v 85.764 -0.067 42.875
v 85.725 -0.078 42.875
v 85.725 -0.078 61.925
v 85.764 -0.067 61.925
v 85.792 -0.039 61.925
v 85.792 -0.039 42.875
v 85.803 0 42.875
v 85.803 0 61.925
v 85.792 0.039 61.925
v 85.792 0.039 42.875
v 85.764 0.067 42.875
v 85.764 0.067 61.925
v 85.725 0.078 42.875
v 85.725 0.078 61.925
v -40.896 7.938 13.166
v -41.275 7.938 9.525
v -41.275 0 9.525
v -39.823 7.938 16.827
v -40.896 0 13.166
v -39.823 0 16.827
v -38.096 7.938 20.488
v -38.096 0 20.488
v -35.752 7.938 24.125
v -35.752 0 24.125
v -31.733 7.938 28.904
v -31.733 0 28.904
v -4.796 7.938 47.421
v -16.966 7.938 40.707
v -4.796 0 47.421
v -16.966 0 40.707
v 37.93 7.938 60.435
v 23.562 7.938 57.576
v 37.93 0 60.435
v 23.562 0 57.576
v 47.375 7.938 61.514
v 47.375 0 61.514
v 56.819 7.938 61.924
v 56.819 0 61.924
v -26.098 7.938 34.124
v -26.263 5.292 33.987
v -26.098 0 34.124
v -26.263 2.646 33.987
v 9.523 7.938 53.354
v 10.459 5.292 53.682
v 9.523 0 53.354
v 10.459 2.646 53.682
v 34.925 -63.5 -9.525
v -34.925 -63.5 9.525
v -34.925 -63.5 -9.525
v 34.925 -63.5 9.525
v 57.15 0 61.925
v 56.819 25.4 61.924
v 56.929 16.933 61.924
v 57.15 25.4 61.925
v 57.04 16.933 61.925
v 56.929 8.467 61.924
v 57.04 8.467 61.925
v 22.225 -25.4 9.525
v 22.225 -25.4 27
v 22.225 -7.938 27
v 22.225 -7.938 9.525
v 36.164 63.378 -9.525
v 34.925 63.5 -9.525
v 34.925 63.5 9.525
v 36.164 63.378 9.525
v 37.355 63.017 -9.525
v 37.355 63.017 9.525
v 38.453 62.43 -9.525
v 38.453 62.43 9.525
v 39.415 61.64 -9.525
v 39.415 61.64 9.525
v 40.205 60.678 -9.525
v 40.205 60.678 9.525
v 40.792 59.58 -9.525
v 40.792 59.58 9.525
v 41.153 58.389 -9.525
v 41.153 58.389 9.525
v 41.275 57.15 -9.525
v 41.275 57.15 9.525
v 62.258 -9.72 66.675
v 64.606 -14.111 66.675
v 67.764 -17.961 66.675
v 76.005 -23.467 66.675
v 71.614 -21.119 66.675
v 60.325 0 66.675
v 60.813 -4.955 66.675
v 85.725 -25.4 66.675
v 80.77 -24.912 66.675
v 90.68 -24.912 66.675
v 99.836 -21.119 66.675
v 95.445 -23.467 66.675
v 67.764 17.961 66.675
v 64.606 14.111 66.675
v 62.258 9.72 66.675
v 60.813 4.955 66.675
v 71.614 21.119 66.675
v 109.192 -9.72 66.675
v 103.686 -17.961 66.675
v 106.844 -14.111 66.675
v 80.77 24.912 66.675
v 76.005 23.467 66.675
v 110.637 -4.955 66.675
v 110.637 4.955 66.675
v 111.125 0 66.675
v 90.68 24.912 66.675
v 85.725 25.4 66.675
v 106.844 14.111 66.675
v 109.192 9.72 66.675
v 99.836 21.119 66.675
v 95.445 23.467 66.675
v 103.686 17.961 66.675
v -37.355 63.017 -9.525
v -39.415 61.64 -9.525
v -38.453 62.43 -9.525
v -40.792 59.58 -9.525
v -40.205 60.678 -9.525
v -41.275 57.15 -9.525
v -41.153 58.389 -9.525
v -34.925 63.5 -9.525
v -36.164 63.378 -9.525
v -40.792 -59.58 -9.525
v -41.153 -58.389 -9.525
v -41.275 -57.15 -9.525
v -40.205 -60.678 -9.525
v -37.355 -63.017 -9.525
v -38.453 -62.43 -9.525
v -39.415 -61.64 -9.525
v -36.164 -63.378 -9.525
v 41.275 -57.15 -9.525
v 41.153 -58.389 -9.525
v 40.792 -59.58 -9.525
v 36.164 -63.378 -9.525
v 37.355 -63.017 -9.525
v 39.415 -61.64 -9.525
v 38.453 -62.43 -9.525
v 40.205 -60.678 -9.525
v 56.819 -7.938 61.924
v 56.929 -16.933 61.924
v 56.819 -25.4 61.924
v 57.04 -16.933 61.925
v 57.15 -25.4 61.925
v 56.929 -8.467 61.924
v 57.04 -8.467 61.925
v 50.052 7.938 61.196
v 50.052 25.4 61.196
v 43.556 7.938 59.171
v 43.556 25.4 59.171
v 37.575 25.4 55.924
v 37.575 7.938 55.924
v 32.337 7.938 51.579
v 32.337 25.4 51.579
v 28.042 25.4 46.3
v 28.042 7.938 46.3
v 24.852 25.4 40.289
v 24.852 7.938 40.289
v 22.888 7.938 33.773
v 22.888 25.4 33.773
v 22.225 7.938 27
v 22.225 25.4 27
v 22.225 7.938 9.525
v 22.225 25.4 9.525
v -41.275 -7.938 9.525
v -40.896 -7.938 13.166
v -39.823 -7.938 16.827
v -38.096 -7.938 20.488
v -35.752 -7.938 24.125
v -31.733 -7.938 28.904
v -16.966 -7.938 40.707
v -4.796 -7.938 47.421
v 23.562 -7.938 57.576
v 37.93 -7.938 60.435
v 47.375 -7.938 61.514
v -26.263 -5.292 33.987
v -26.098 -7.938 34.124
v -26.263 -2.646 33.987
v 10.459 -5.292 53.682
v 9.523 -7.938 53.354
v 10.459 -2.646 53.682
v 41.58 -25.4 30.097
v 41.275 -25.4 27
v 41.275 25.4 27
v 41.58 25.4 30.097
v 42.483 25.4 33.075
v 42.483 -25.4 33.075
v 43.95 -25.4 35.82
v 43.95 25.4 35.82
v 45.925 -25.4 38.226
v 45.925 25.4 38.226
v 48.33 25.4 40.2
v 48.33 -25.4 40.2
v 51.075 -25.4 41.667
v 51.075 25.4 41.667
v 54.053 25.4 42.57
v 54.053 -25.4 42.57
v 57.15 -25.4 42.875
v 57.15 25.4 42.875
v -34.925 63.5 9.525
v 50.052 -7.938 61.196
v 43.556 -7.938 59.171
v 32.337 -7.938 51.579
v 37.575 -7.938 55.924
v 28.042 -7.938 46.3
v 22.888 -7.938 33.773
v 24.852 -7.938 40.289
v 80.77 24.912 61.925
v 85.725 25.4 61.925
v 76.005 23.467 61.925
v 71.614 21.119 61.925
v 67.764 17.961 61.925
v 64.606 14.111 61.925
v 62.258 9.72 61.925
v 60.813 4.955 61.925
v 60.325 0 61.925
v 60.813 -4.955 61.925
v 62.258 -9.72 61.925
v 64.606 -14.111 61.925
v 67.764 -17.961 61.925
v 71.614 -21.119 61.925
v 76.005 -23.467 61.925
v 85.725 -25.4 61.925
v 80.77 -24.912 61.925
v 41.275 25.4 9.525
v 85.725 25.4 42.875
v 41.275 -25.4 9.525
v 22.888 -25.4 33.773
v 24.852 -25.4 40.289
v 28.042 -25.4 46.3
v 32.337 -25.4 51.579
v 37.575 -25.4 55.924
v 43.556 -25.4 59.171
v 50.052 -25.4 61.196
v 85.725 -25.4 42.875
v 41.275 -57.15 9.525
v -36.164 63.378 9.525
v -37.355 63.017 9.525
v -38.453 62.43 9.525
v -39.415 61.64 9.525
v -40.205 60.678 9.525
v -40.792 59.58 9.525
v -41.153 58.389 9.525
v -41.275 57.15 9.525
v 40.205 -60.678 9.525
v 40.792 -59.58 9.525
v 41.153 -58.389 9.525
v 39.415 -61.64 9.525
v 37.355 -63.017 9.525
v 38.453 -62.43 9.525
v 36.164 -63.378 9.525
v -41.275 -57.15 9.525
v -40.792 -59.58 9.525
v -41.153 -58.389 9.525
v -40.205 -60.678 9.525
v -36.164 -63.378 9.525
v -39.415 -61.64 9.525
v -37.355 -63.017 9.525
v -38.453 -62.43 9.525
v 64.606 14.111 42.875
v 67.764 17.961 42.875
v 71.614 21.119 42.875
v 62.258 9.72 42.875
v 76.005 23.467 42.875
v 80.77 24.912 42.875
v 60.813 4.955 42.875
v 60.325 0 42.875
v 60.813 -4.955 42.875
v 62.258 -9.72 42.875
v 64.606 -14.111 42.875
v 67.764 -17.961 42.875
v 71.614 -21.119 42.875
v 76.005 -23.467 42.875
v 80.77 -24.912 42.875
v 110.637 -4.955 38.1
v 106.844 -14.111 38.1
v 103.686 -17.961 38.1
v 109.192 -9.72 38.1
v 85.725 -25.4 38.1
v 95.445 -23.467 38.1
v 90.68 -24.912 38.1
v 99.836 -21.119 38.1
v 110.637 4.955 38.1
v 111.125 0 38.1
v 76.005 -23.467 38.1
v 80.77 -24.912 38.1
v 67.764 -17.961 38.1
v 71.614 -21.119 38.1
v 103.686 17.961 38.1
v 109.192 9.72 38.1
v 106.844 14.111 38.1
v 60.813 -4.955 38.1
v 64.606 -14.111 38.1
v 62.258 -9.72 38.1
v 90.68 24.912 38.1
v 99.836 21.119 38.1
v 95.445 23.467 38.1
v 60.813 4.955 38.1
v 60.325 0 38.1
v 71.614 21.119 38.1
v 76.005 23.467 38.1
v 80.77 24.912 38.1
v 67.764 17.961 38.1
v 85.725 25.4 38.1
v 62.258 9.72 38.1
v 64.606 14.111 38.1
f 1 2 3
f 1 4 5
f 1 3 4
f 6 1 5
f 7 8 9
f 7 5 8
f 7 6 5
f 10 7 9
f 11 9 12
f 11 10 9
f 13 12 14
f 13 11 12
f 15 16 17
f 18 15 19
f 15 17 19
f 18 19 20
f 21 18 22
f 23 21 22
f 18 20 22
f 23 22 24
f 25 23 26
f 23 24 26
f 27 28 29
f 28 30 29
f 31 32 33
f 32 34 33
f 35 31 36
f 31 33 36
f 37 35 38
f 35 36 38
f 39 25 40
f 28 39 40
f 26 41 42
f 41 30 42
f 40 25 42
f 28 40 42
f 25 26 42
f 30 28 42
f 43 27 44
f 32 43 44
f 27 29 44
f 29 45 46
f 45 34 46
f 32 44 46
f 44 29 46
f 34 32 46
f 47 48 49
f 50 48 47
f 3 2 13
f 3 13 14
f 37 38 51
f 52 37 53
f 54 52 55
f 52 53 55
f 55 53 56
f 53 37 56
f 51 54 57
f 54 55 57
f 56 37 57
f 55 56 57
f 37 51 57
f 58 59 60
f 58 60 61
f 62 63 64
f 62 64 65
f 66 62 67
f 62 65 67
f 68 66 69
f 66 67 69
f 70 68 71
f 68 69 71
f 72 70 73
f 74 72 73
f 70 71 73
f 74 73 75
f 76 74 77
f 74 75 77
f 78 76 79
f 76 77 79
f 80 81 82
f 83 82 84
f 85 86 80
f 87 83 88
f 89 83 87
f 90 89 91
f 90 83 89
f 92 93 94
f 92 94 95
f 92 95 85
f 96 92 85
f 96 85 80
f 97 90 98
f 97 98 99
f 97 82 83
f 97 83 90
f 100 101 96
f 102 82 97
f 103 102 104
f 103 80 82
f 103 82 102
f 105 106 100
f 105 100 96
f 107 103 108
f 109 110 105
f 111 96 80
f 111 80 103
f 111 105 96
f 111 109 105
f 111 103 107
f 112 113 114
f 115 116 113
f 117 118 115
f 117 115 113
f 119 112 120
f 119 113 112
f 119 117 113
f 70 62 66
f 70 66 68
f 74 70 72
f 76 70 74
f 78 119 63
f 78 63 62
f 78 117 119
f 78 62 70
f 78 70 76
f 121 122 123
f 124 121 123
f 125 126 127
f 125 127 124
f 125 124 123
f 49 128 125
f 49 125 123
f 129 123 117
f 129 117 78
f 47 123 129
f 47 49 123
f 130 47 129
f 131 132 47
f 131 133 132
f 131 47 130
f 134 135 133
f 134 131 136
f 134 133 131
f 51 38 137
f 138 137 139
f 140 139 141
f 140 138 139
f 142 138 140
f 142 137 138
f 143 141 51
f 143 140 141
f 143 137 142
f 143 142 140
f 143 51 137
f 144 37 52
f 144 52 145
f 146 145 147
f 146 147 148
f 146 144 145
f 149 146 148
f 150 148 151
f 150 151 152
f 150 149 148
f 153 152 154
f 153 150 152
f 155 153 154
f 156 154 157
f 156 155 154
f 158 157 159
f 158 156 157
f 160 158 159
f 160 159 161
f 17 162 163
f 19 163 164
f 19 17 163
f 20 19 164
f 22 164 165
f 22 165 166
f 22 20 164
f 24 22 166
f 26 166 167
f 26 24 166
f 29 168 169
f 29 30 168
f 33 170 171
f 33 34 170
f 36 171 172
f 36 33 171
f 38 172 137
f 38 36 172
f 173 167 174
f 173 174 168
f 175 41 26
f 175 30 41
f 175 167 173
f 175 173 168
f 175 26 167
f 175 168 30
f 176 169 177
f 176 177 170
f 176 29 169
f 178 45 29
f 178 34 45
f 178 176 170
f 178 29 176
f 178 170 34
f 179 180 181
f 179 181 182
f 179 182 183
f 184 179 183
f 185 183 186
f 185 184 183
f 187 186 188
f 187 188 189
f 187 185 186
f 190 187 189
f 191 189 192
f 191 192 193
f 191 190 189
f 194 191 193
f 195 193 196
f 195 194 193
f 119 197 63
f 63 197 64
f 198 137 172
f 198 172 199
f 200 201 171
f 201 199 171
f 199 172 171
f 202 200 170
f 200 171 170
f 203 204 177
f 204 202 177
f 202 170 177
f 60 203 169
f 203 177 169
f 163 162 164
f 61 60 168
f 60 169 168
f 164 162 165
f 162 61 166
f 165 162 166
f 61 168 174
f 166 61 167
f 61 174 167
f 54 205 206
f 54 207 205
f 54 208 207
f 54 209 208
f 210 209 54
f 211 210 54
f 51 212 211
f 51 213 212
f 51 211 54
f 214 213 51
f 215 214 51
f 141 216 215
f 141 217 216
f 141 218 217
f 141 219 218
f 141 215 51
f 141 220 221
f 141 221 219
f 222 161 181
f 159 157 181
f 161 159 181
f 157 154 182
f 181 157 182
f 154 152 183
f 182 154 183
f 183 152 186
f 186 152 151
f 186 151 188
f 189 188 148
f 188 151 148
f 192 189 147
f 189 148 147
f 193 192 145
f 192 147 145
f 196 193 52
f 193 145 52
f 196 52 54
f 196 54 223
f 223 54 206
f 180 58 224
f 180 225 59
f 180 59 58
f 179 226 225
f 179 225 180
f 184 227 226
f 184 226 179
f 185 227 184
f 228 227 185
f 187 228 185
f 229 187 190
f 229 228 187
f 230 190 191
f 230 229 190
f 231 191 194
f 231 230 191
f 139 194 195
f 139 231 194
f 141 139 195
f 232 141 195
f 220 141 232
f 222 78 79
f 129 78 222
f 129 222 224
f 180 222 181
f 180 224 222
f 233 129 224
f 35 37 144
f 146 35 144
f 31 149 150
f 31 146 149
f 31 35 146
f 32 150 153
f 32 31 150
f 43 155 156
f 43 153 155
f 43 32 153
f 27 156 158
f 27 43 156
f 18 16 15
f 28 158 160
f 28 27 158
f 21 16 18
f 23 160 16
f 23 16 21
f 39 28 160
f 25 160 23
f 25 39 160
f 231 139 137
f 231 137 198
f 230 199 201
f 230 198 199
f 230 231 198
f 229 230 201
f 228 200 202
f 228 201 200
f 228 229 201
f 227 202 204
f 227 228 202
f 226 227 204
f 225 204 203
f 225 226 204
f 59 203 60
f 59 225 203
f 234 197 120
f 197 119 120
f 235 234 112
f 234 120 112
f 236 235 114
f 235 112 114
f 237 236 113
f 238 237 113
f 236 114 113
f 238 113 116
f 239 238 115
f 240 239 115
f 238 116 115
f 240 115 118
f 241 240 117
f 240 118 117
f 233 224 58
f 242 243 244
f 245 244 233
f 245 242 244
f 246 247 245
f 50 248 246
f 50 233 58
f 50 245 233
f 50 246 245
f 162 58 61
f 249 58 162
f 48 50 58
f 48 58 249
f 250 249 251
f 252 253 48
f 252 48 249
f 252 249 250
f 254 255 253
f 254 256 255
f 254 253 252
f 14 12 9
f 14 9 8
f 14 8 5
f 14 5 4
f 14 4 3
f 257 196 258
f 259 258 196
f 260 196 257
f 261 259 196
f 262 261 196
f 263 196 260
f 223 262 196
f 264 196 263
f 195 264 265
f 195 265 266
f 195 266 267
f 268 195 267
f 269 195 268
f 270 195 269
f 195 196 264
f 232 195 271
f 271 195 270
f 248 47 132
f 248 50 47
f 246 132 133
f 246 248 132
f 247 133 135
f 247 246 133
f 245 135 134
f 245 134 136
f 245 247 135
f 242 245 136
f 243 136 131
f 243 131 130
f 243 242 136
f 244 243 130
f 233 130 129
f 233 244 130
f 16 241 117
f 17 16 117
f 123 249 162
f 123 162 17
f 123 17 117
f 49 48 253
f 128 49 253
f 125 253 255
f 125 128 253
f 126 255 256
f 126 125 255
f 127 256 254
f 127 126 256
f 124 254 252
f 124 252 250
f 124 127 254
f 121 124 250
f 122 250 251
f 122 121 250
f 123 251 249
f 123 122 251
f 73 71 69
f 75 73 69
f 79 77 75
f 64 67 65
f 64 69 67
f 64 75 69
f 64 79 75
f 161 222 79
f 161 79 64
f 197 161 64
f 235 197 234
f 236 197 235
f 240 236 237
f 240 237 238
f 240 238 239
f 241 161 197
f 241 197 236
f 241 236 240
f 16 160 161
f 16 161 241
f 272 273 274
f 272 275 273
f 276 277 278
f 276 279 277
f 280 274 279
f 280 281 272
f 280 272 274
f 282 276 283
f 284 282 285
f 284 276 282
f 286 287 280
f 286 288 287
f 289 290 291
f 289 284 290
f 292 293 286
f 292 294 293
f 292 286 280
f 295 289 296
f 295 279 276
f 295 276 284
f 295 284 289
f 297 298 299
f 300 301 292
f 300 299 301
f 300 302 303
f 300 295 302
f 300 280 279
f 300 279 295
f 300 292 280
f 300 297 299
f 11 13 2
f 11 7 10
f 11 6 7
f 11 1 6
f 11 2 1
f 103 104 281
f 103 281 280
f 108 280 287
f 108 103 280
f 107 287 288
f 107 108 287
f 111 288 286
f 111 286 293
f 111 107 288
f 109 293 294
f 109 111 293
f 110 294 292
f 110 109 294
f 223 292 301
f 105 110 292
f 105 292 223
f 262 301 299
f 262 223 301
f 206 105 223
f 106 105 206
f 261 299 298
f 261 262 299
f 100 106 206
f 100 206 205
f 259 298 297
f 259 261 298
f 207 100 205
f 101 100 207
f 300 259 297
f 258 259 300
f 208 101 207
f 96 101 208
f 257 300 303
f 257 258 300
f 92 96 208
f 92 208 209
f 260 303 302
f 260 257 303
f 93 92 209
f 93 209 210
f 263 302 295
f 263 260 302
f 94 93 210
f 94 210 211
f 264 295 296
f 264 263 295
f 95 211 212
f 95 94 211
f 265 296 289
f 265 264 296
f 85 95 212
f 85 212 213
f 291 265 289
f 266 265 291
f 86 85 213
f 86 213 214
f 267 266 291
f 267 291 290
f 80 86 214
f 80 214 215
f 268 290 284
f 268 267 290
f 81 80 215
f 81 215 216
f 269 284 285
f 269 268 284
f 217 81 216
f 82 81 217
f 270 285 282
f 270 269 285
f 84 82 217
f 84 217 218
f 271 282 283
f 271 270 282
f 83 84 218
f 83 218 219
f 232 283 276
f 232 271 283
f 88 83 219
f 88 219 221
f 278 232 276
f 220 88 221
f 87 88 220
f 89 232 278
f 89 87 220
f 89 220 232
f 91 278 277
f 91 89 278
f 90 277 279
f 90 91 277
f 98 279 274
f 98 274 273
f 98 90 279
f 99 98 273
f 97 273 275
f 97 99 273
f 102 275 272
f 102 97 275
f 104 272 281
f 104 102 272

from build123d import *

# Parameters (mm, degrees)
F1_DEPTH = 63.5
F2_DEPTH = 7.9375
F0_W     = 25.4
F0_H     = 19.05
F3_DEPTH = 25.4
F5_R     = 6.35


with BuildPart() as f1:
    # F0 (on Front) → F1 (new body, symmetric)
    with BuildSketch(Plane.XZ):
        Polygon((-41.275, 9.525), (-41.275, -9.525), (41.275, -9.525), (41.275, 9.525), (22.225, 9.525), align=None)
    extrude(amount=F1_DEPTH, both=True)

    # F0 (on Front) → F2 (join, symmetric)
    with BuildSketch(Plane.XZ):
        with BuildLine():
            add(Edge.make_bspline(
                [(-41.275, 9.525), (-41.1430037548, 34.1428554675), (9.6645992103, 61.636308072), (56.8187902942, 61.9236294583)],
                knots=[0, 0, 0, 0, 111.2440300422, 111.2440300422, 111.2440300422, 111.2440300422], degree=3))
            Line((-41.275, 9.525), (22.225, 9.525))
            Line((22.225, 9.525), (22.225, 27.0002))
            ThreePointArc((22.225, 27.0002), (32.3374716728, 51.5785250653), (56.8187902942, 61.9236294583))
        make_face()
    extrude(amount=F2_DEPTH, both=True)

    # F0 (on Front) → F3 (join, symmetric)
    with BuildSketch(Plane.XZ):
        with BuildLine():
            Line((22.225, 9.525), (41.275, 9.525))
            Line((41.275, 9.525), (41.275, 27.0002))
            ThreePointArc((41.275, 27.0002), (45.9246798487, 38.2255201513), (57.15, 42.8752))
            Line((57.15, 42.8752), (60.325, 42.8752))
            Line((60.325, 42.8752), (60.325, 61.9252))
            Line((60.325, 61.9252), (57.15, 61.9252))
            add(Edge.make_bspline(
                [(56.8187902942, 61.9236294583), (56.9292137967, 61.9243022943), (57.0396172645, 61.9248259369), (57.15, 61.9252)],
                knots=[111.2440300422, 111.2440300422, 111.2440300422, 111.2440300422, 111.5045361635, 111.5045361635, 111.5045361635, 111.5045361635], degree=3))
            ThreePointArc((56.8187902942, 61.9236294583), (32.3374716728, 51.5785250653), (22.225, 27.0002))
            Line((22.225, 27.0002), (22.225, 9.525))
        make_face()
        with Locations((73.025, 52.4002)):
            Rectangle(F0_W, F0_H)
    extrude(amount=F3_DEPTH, both=True)

    # F0 (on Front) → F4 (revolve)
    with BuildSketch(Plane.XZ):
        Polygon((85.725, 66.675), (85.725, 61.9252), (85.802746323, 61.9252), (85.802746323, 42.8752), (85.725, 42.8752), (85.725, 38.1), (111.125, 38.1), (111.125, 66.675), align=None)
    revolve(axis=Axis((85.725, 0, 52.3875), (0, 0, 1)))

    # F5
    f5_edges = [f1.edges().sort_by_distance(p)[0] for p in [
        (-41.275, -63.5, 0),
        (41.275, -63.5, 0),
        (41.275, 63.5, 0),
        (-41.275, 63.5, 0),
    ]]
    fillet(f5_edges, radius=F5_R)


solid = f1.part
